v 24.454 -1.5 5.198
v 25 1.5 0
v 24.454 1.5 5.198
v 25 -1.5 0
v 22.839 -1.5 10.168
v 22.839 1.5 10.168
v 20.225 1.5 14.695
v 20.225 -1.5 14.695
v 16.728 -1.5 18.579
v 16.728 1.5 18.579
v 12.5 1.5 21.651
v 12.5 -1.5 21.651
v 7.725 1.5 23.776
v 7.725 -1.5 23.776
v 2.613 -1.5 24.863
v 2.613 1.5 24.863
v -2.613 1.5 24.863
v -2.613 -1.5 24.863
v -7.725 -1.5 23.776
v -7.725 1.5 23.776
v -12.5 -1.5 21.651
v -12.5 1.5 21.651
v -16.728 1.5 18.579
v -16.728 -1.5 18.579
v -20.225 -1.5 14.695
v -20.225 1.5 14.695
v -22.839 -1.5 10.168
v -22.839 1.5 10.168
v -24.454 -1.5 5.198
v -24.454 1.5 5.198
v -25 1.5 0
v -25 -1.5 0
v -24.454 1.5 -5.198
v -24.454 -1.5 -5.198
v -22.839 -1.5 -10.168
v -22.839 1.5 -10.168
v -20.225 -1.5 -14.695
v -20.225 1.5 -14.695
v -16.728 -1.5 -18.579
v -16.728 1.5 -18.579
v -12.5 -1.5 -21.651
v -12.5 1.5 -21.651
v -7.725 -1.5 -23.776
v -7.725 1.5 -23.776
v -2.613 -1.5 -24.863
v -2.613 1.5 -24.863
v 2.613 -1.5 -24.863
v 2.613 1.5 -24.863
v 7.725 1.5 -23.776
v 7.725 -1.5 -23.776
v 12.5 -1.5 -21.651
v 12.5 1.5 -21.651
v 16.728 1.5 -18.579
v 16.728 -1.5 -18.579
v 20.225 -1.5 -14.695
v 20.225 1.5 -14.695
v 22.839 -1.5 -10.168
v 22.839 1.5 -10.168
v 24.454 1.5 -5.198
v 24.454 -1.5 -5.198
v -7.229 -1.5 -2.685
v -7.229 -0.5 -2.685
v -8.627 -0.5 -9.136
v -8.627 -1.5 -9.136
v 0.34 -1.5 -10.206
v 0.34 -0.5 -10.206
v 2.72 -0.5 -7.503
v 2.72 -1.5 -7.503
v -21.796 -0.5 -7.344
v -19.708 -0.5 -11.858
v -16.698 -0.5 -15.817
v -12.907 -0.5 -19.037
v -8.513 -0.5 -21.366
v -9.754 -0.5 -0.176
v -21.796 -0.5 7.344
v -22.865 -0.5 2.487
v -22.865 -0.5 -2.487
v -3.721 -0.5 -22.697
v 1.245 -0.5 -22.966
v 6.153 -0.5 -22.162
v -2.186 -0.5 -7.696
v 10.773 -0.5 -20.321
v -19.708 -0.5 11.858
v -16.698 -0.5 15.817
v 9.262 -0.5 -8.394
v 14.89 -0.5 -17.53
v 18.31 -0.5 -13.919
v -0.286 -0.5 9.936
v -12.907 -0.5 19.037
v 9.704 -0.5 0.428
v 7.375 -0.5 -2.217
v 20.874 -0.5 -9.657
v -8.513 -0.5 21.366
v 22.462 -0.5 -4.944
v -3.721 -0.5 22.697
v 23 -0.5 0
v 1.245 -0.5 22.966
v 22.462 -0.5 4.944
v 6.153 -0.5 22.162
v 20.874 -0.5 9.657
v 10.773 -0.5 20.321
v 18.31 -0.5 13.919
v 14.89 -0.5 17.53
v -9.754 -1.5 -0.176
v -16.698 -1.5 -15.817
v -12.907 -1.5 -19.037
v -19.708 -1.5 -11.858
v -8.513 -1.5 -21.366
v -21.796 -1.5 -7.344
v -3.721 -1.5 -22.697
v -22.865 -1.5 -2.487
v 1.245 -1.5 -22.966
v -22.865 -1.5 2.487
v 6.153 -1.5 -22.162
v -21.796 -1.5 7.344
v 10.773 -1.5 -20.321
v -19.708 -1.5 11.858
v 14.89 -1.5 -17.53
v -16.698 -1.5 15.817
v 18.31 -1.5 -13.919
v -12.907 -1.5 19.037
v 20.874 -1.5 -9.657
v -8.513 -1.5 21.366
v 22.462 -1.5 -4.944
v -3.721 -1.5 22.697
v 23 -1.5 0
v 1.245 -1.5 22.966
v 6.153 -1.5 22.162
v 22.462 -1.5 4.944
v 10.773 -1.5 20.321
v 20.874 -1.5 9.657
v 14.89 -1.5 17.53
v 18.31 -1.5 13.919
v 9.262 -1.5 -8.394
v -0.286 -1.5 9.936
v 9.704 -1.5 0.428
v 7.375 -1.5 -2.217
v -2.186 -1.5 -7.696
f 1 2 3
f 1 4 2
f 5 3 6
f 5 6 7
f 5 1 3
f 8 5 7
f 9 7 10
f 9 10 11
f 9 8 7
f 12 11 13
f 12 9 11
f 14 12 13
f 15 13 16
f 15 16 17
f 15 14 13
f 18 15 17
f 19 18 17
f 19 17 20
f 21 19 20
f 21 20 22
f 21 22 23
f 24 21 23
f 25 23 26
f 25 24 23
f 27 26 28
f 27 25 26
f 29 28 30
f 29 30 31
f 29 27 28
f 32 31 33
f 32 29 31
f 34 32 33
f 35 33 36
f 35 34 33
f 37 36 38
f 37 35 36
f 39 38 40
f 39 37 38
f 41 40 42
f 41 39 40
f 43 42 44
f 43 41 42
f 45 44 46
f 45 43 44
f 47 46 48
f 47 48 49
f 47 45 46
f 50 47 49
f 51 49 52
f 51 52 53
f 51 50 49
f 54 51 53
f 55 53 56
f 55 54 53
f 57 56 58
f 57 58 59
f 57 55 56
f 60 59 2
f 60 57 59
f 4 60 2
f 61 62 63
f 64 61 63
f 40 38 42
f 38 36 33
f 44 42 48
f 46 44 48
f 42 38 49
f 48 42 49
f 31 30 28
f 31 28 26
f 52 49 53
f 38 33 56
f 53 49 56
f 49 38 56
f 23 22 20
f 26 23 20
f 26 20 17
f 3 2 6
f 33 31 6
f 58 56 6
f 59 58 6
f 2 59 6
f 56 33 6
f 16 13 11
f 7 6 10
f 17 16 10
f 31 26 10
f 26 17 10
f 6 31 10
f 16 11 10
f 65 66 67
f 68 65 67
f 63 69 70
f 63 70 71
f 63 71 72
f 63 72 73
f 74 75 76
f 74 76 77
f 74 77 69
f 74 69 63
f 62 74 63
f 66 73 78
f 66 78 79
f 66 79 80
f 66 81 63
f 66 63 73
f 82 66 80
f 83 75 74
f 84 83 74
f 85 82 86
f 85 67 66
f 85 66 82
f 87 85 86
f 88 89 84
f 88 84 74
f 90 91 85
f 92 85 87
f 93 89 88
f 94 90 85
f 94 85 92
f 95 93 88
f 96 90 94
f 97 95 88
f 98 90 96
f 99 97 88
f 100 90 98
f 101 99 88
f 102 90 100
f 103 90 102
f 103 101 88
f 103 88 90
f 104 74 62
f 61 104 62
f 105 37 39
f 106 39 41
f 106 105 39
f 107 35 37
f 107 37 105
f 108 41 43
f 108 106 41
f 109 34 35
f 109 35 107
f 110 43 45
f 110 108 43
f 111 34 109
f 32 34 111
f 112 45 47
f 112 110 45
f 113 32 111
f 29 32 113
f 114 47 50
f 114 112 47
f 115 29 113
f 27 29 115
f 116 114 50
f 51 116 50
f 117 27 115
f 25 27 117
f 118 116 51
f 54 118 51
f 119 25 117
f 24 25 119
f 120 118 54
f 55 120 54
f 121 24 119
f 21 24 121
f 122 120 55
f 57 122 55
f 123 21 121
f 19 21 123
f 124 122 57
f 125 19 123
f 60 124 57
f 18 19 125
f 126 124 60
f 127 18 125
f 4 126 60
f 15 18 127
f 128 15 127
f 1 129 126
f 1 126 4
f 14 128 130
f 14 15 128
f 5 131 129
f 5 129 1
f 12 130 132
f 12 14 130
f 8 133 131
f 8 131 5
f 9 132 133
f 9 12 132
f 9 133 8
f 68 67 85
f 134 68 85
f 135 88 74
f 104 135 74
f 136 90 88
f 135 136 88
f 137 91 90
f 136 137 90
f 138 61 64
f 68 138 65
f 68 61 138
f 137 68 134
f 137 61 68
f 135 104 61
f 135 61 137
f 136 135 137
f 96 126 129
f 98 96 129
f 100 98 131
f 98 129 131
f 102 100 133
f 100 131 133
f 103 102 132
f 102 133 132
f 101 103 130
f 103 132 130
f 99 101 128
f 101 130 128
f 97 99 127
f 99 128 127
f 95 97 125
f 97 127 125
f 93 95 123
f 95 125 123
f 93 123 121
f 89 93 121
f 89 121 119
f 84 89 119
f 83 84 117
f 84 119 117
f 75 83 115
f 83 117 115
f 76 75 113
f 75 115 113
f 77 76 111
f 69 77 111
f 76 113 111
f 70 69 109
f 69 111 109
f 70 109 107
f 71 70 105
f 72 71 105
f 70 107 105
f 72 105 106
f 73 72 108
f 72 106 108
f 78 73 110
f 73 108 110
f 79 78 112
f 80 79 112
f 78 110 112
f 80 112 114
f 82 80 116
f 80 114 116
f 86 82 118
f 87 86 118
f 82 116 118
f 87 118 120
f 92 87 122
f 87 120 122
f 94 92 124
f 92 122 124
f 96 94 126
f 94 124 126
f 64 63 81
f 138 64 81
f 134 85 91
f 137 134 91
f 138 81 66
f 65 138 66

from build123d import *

# Parameters (mm, degrees)
F0_R     = 25
F1_DEPTH = 1.5
F2_R     = 23
F3_DEPTH = 1
F5_DEPTH = 1
F7_DEPTH = 1


with BuildPart() as f1:
    # F0 (on Front) → F1 (new body, symmetric)
    with BuildSketch(Plane.XZ):
        Circle(F0_R)
    extrude(amount=F1_DEPTH, both=True)

    # F2 (on face) → F3 (cut)
    with BuildSketch(Plane.XZ.offset(1.5)):
        Circle(F2_R)
    extrude(amount=-F3_DEPTH, mode=Mode.SUBTRACT)

    # F4 (on face) → F5 (join)
    with BuildSketch(Plane.XZ.offset(0.5)):
        Polygon((9.7037305963, 0.4278131442), (-0.2857921618, 9.9359199418), (-9.7544326689, -0.1756772261), (0.3401018036, -10.2059959115), align=None)
    extrude(amount=F5_DEPTH)

    # F6 (on face) → F7 (join)
    with BuildSketch(Plane.XZ.offset(0.5)):
        Polygon((7.3748351342, -2.2169979865), (2.7204787029, -7.5027198647), (9.2619833934, -8.3943828612), align=None)
        Polygon((-2.1856052259, -7.6963560187), (-7.2287256394, -2.6853171189), (-8.6267801345, -9.1355453032), align=None)
    extrude(amount=F7_DEPTH)


solid = f1.part
